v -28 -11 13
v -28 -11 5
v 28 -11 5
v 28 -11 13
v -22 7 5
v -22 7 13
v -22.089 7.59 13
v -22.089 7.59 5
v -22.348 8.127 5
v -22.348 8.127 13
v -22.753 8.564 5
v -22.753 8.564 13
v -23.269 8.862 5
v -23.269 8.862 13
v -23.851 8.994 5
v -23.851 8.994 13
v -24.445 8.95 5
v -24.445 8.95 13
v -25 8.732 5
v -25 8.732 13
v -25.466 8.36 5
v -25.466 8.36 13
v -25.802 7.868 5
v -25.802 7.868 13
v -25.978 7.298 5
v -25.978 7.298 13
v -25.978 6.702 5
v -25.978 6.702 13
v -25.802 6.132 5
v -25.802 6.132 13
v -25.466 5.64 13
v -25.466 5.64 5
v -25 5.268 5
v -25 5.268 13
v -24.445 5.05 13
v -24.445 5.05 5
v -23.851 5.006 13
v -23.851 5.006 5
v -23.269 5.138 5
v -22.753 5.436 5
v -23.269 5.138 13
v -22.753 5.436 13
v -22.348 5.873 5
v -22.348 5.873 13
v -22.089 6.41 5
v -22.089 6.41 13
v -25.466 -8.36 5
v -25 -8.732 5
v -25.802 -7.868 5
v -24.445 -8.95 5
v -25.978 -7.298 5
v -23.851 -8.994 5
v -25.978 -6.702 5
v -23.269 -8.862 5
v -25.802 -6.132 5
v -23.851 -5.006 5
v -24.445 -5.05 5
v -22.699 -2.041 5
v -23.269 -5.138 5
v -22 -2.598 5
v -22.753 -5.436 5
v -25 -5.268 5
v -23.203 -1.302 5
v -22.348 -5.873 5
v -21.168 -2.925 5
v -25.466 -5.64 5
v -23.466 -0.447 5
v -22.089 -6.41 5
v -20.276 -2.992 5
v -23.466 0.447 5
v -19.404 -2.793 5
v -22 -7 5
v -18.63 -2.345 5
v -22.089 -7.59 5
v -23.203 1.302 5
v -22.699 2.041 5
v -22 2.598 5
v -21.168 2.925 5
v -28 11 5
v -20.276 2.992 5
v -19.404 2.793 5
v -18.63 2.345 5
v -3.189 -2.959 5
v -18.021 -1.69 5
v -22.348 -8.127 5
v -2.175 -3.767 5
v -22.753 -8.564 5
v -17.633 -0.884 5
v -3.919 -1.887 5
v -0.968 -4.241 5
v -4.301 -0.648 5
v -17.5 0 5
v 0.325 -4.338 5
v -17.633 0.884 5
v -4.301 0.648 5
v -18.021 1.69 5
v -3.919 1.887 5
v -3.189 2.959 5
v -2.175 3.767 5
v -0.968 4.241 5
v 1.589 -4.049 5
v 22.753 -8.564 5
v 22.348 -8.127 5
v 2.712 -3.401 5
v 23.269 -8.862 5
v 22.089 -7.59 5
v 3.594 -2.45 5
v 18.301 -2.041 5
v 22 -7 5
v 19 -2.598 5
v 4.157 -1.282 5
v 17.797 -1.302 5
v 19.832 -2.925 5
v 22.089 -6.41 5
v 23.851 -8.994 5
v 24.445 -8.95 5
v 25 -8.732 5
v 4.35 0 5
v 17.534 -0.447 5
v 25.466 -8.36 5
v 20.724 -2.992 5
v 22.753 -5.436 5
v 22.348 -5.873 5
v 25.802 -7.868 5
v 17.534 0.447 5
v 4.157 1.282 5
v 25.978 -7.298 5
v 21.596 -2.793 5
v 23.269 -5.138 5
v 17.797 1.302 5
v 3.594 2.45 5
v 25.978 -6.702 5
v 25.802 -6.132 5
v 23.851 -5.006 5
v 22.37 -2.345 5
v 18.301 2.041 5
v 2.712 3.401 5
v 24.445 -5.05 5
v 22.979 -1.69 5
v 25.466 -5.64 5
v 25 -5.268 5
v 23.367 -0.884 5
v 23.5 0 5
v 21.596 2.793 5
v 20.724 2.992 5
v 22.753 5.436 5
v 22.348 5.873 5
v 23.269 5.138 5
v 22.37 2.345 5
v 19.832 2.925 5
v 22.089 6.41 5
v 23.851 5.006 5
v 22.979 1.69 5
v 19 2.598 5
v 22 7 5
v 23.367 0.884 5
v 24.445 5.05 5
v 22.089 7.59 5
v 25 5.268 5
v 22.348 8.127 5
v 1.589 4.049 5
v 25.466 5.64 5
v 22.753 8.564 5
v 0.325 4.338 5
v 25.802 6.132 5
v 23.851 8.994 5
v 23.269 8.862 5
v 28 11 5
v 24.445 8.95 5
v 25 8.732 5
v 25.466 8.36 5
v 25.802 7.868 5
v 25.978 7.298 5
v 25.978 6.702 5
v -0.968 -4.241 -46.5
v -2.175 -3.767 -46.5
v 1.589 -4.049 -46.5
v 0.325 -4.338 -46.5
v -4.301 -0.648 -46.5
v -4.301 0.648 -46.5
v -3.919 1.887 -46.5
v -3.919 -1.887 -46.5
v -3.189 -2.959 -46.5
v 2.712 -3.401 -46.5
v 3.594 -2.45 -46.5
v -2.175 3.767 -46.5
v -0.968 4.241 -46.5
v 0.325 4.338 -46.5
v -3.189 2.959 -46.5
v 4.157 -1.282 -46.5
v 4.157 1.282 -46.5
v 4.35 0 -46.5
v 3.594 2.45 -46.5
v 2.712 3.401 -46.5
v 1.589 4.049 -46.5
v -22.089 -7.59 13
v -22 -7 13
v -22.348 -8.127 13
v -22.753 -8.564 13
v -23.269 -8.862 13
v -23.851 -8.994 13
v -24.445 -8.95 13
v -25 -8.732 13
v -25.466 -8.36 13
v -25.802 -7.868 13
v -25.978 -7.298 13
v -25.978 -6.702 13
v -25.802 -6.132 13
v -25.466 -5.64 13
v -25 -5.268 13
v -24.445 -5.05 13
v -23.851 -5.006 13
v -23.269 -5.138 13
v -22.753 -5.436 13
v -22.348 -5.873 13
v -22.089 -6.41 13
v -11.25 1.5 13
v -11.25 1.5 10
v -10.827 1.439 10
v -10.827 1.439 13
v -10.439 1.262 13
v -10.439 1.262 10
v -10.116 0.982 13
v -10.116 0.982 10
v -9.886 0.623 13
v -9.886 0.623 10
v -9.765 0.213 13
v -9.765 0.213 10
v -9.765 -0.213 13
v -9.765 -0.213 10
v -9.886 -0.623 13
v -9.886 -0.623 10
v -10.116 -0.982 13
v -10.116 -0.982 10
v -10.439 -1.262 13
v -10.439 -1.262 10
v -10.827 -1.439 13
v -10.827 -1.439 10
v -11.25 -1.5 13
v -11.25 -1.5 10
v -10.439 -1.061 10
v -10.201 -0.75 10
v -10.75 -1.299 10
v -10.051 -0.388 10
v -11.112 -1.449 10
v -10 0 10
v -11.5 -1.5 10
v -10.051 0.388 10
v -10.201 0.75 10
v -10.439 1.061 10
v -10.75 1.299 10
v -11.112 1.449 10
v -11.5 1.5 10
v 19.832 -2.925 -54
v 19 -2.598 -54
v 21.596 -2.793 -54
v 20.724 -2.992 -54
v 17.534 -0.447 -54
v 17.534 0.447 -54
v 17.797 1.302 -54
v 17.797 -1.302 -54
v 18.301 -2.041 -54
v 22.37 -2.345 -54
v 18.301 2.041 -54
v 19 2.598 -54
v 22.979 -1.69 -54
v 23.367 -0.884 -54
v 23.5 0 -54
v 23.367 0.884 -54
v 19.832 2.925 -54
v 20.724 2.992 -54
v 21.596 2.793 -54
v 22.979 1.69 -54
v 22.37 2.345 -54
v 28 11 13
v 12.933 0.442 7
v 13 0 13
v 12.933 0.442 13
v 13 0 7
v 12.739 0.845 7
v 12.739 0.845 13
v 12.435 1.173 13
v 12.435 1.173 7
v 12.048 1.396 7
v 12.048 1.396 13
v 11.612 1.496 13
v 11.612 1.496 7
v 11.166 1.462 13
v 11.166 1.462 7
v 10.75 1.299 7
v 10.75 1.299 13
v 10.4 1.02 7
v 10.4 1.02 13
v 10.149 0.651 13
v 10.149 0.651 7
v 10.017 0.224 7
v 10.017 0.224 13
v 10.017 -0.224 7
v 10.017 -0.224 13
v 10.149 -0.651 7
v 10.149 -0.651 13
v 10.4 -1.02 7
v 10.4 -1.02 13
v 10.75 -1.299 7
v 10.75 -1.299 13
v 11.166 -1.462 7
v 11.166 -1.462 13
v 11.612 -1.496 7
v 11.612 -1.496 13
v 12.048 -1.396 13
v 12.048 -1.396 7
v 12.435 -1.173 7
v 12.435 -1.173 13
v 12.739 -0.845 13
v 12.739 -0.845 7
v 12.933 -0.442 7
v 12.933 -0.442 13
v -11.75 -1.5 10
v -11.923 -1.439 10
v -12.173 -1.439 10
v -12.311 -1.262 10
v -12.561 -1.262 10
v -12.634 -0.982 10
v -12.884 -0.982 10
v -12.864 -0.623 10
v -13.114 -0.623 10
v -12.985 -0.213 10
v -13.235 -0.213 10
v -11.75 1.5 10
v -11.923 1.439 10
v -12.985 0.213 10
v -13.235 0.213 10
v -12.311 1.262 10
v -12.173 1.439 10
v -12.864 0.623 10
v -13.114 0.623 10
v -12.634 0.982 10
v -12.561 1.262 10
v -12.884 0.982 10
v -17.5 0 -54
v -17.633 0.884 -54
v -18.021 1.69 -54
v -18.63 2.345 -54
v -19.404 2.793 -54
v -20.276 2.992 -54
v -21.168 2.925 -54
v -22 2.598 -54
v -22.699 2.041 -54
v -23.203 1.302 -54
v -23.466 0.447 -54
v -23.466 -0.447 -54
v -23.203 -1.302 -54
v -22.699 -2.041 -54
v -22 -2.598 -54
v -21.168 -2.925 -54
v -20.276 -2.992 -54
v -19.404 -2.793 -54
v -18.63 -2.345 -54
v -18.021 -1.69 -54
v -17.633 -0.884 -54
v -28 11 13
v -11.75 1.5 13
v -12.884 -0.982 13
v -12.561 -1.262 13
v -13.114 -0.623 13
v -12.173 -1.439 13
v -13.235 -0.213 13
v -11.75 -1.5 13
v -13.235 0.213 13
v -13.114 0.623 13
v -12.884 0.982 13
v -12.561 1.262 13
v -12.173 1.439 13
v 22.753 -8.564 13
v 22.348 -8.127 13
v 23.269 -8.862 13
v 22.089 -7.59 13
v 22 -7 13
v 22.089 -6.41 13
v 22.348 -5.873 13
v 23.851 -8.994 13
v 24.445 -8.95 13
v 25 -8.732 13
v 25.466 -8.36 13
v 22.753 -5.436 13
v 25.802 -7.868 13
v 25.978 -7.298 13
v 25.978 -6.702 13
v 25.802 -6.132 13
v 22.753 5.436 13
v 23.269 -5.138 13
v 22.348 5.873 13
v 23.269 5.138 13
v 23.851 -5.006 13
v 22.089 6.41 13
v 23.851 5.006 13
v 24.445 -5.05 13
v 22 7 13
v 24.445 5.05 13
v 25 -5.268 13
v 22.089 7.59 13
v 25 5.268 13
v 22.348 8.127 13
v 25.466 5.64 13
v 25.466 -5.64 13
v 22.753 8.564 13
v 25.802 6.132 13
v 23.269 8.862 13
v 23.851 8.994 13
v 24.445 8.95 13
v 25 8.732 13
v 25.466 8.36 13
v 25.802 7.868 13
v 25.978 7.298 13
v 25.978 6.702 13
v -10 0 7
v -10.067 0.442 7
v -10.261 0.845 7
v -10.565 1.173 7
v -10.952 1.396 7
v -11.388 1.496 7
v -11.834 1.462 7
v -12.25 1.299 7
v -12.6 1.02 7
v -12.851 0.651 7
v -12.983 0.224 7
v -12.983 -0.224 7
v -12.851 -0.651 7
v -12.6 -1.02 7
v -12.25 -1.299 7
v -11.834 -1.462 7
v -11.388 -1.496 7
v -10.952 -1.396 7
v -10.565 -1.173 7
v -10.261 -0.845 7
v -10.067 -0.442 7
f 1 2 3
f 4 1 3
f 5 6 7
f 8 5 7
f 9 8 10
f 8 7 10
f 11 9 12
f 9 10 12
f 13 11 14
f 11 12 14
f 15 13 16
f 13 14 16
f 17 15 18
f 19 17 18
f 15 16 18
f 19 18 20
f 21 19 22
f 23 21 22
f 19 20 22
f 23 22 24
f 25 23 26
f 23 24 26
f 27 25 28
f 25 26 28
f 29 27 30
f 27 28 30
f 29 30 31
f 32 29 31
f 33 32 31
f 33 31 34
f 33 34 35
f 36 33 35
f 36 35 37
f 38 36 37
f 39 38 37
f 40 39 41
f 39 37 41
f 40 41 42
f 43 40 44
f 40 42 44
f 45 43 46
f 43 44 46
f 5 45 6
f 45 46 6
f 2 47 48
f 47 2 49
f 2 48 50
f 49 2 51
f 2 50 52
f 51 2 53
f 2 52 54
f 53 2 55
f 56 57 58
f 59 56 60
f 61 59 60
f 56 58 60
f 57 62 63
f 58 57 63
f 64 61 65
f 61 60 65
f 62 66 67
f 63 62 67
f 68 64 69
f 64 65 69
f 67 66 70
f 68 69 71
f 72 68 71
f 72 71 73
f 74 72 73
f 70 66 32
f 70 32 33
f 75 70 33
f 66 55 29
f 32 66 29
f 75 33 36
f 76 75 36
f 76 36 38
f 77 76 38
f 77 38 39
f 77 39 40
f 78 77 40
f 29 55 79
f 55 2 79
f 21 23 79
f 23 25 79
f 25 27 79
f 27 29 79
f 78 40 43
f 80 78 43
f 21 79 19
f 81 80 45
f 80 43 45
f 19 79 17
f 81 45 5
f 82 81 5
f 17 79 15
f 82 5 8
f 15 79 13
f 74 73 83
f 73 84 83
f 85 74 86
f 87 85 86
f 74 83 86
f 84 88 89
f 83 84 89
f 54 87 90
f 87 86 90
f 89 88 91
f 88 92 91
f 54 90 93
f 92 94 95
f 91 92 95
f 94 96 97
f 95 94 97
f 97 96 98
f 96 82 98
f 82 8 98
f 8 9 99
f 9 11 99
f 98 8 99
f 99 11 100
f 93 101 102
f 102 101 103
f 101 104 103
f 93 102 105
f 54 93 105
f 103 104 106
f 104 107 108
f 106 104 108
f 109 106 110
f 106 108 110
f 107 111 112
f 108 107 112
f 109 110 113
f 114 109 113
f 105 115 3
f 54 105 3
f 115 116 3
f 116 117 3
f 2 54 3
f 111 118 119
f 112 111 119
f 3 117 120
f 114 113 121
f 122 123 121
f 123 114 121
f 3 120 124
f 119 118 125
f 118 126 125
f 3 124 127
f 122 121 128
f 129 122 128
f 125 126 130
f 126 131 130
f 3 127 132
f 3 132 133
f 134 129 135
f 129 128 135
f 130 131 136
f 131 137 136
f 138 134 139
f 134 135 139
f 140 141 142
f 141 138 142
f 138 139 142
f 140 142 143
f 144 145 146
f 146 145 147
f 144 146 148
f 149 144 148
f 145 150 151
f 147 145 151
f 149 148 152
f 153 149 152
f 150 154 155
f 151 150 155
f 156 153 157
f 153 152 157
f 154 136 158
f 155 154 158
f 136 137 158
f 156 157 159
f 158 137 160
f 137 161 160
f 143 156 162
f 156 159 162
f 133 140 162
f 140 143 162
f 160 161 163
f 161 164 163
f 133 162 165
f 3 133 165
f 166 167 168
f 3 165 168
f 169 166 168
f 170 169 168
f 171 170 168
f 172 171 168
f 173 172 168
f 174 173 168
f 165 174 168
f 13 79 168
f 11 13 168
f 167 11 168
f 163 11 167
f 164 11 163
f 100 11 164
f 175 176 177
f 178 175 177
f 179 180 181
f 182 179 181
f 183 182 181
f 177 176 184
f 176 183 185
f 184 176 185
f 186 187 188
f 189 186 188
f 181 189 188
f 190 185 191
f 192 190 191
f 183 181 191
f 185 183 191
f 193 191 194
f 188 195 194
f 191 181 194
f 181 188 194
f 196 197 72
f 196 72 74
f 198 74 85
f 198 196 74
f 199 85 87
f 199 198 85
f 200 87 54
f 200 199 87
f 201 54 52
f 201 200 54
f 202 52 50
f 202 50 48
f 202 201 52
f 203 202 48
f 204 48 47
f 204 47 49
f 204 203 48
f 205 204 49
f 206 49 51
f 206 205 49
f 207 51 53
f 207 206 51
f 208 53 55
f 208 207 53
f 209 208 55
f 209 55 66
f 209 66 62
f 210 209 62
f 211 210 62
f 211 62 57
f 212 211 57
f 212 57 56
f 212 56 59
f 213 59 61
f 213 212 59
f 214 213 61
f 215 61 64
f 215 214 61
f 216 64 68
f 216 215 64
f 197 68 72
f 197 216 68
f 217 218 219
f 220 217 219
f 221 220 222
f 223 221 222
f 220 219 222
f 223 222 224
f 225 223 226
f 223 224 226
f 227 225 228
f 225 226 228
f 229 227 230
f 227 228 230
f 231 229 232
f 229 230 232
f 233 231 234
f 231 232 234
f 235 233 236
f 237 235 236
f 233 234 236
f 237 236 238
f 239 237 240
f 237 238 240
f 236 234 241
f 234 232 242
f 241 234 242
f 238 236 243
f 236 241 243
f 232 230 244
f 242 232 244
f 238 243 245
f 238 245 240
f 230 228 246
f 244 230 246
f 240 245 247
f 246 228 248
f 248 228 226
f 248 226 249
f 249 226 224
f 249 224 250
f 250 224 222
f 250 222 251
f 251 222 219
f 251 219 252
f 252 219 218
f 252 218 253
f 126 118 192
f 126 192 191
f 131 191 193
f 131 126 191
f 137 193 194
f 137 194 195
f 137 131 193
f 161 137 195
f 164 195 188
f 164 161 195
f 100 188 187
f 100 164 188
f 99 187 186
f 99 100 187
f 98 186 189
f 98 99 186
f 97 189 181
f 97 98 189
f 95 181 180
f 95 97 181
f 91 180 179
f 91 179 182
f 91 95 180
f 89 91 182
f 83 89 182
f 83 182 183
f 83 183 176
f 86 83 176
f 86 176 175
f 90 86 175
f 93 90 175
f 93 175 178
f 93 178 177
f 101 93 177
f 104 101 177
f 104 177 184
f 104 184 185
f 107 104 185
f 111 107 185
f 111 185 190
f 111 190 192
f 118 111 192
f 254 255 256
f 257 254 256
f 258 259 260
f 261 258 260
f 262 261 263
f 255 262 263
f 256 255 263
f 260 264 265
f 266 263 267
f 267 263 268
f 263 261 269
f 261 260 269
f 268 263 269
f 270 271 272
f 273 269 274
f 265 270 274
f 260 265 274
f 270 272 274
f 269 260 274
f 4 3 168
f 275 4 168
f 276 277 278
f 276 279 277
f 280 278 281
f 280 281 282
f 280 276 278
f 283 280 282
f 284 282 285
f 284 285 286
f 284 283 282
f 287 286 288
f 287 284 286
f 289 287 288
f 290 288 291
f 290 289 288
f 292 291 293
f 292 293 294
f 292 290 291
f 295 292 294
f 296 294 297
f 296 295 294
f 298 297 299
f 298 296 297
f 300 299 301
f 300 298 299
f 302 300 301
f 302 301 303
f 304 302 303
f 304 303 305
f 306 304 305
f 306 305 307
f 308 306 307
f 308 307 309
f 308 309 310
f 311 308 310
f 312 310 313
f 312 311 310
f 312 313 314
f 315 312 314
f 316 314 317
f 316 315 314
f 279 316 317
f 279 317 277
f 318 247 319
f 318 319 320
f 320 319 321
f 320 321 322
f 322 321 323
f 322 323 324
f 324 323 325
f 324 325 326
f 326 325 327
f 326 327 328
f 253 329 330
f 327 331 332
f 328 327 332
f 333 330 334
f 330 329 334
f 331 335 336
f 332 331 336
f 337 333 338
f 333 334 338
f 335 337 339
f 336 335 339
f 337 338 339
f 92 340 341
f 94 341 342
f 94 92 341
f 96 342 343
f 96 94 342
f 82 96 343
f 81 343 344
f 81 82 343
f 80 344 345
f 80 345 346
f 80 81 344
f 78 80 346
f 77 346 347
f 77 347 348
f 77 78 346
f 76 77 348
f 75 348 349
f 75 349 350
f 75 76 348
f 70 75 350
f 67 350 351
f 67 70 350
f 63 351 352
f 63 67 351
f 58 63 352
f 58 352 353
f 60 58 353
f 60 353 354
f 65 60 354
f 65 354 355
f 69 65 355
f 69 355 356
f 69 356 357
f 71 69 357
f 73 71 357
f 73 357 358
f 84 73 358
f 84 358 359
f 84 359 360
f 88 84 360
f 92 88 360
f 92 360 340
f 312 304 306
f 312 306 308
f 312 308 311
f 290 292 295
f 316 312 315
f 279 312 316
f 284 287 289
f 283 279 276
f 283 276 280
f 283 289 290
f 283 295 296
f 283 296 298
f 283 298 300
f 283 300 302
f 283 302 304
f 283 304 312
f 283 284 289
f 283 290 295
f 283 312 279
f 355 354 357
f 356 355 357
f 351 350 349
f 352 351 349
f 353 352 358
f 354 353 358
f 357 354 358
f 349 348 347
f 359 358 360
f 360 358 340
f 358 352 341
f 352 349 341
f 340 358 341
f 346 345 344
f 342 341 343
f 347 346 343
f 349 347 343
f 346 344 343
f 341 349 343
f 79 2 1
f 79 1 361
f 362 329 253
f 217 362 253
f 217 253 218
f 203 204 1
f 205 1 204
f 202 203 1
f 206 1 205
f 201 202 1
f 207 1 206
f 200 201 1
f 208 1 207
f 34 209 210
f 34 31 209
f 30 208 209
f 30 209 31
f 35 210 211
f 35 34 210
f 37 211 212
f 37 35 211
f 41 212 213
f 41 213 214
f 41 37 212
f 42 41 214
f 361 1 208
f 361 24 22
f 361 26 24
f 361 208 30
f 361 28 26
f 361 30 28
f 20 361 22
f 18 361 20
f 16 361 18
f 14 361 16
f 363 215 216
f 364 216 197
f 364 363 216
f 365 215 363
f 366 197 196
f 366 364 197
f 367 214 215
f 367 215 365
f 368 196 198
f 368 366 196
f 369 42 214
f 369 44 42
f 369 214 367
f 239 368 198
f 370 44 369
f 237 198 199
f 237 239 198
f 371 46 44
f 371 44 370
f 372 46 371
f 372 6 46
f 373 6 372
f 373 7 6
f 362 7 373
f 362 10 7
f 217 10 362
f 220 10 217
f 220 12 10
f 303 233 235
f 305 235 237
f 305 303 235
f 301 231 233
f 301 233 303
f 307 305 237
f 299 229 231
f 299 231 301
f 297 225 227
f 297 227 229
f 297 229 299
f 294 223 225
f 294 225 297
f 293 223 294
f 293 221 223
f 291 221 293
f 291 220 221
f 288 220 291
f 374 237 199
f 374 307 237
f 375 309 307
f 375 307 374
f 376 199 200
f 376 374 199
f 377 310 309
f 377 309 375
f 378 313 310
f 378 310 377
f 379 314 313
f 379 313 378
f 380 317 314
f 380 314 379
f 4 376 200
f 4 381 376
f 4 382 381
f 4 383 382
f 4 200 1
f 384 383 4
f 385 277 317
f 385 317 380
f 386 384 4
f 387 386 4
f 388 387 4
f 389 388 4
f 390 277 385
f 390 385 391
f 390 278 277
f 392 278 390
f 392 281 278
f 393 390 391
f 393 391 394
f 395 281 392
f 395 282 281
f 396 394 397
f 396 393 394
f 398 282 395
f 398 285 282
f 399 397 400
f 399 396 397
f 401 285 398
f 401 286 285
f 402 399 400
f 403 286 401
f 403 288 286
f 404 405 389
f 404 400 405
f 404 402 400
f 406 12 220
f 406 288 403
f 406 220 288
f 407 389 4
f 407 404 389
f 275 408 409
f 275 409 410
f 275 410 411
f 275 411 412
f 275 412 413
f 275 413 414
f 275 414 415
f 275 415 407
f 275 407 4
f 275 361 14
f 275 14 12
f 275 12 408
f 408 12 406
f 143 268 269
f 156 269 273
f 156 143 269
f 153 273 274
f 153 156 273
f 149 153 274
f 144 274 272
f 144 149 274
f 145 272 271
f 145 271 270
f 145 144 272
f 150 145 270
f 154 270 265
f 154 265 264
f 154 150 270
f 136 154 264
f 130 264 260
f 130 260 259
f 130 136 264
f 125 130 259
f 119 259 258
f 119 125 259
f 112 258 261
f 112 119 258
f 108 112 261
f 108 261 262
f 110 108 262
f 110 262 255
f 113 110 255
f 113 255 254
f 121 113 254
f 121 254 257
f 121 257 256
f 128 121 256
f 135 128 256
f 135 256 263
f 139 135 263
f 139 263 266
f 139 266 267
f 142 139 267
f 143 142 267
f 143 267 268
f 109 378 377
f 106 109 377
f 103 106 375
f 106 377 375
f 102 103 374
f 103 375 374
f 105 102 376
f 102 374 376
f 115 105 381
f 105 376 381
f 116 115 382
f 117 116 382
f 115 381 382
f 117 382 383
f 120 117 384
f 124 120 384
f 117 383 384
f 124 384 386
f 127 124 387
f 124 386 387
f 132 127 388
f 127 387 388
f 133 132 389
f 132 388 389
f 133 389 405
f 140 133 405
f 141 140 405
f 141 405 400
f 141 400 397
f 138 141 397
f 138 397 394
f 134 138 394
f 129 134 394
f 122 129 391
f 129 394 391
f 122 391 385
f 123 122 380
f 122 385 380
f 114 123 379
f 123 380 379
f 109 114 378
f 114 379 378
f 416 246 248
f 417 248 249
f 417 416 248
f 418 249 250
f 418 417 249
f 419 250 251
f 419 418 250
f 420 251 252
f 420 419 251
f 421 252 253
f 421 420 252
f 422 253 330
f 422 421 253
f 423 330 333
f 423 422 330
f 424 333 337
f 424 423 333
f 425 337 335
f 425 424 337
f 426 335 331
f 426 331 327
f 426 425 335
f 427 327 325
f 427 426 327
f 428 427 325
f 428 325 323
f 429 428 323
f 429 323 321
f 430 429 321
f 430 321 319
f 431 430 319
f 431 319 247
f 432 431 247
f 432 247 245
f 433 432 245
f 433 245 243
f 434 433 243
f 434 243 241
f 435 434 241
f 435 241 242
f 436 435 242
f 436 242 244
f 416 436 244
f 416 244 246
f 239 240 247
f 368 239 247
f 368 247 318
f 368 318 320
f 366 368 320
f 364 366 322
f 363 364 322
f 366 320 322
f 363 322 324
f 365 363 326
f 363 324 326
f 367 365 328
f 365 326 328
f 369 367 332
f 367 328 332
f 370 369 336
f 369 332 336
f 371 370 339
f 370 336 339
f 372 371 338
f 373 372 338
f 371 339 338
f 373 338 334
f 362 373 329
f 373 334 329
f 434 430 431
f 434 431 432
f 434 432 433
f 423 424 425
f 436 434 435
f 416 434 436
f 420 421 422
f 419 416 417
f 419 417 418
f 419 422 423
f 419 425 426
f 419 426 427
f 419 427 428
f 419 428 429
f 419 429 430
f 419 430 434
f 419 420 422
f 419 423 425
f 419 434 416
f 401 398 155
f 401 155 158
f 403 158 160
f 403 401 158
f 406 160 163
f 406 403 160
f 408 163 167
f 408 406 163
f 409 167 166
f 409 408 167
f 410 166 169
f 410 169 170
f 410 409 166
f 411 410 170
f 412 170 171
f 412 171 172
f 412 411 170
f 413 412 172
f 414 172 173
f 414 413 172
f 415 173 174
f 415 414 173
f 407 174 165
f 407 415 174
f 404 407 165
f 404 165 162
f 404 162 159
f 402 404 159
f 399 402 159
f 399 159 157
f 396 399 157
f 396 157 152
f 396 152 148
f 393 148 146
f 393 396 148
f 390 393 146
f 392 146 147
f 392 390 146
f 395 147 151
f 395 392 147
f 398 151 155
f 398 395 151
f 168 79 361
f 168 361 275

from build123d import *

# Parameters (mm, degrees)
SKETCH_4_R               = 3
EXTRUDE_1_DEPTH          = 54
CUT_EXTRUDE_1_DEPTH      = 63.657800791
SKETCH_6_R               = 4
CUT_EXTRUDE_2_DEPTH      = 4.5
SKETCH_7_R               = 2.25
CUT_EXTRUDE_3_DEPTH      = 21.5
EXTRUDE_2_DEPTH          = 54
SKETCH_9_R               = 2.5
CUT_EXTRUDE_4_DEPTH      = 5
SKETCH_10_R              = 2.5
CUT_EXTRUDE_5_DEPTH      = 5
SKETCH_11_R              = 4.35
CUT_EXTRUDE_6_DEPTH      = 46.5
SKETCH_12_R              = 1.5
CUT_EXTRUDE_7_DEPTH      = 3
SKETCH_13_R              = 1.5
EXTRUDE_4_DEPTH          = 3
SKETCH_14_R              = 1.5
CUT_EXTRUDE_8_DEPTH      = 6
CUT_EXTRUDE_9_DEPTH      = 3
EXTRUDE_START            = 5
SKETCH_16_W              = 56
SKETCH_16_H              = 22
EXTRUDE_5_DEPTH          = 8
SKETCH_18_R              = 3
EXTRUDE_6_DEPTH          = 67
SKETCH_19_R              = 4.35
EXTRUDE_7_DEPTH          = 59.5
SKETCH_20_R              = 2
CUT_EXTRUDE_10_DEPTH     = 8
MIRROR_4_COPY_1_SKETCH_R = 2
MIRROR_4_COPY_1_DEPTH    = 8
CUT_EXTRUDE_START        = -3
SKETCH_21_R              = 1.5
CUT_EXTRUDE_11_DEPTH     = 3
SKETCH_22_R              = 1.5
CUT_EXTRUDE_12_DEPTH     = 3


with BuildPart() as part:
    # 草图4 → 凸台-拉伸1 (new body)
    with BuildSketch(Plane.XY):
        Polygon((-14.75, -7), (-16.25, -7), (-16.25, -6.5), (-20.75, -6.5), (-20.75, -7), (-22.25, -7), (-22.25, -11), (-20.75, -11), (-20.75, -13), (-29, -13), (-29, 13), (-23, 13), (-20.6, 10.6), (-19.1, 10.6), (-16.7, 13), (0, 13), (0, -13), (-16.25, -13), (-16.25, -11), (-14.75, -11), align=None)
        with Locations((-20.5, 0)):
            Circle(SKETCH_4_R, mode=Mode.SUBTRACT)
    extrude(amount=-EXTRUDE_1_DEPTH)

    # 草图5 → 切除-拉伸1 (cut, through all)
    with BuildSketch(Plane.XY):
        Polygon((-5.5, -12), (-4.5, -12), (-4.5, -13), (-2.25, -13), (-2.25, -12), (-1.25, -12), (-1.25, -10), (-5.5, -10), align=None)
    cut_extrude_1 = extrude(amount=-CUT_EXTRUDE_1_DEPTH, mode=Mode.SUBTRACT)

    # 镜向1: 切除-拉伸1 across plane
    add(cut_extrude_1.mirror(Plane.ZX), mode=Mode.SUBTRACT)

    # 草图6 → 切除-拉伸2 (cut)
    with BuildSketch(Plane(origin=(0, 13, 0), x_dir=(-1, 0, 0), z_dir=(0, 1, 0))):
        with Locations(Location((11.5, -25, 0), (0, 0, 90))):
            Circle(SKETCH_6_R)
        with Locations(Location((11.5, -5, 0), (0, 0, 90))):
            Circle(SKETCH_6_R)
    extrude(amount=-CUT_EXTRUDE_2_DEPTH, mode=Mode.SUBTRACT)

    # 草图7 → 切除-拉伸3 (cut)
    with BuildSketch(Plane(origin=(0, 8.5, 0), x_dir=(1, 0, 0), z_dir=(0, 1, 0))):
        with Locations(Location((-11.5, 25, 0), (0, 0, 270))):
            Circle(SKETCH_7_R)
        with Locations(Location((-11.5, 5, 0), (0, 0, 270))):
            Circle(SKETCH_7_R)
    extrude(amount=-CUT_EXTRUDE_3_DEPTH, mode=Mode.SUBTRACT)

    # 镜向2: part across plane


with BuildPart() as part_1:
    add(part.part)
    add(part.part.mirror(Plane(origin=(0, 0, 0), x_dir=(0, 0, 1), z_dir=(1, 0, 0))))

    # 草图8 → 凸台-拉伸2 (add)
    with BuildSketch(Plane.XY):
        Polygon((16.7, 13), (23, 13), (20.6, 10.6), (19.1, 10.6), align=None)
    extrude(amount=-EXTRUDE_2_DEPTH)

    # 草图9 → 切除-拉伸4 (cut)
    with BuildSketch(Plane(origin=(0, 13, 0), x_dir=(1, 0, 0), z_dir=(0, 1, 0))):
        with Locations(Location((18, 46.5, 0), (0, 0, 270))):
            Circle(SKETCH_9_R)
        with Locations(Location((18, 11, 0), (0, 0, 270))):
            Circle(SKETCH_9_R)
    extrude(amount=-CUT_EXTRUDE_4_DEPTH, mode=Mode.SUBTRACT)

    # 草图10 → 切除-拉伸5 (cut)
    with BuildSketch(Plane(origin=(29, 0, 0), x_dir=(0, 0, -1), z_dir=(1, 0, 0))):
        with Locations((11, 8)):
            Circle(SKETCH_10_R)
        with Locations((38.5, 8)):
            Circle(SKETCH_10_R)
    extrude(amount=-CUT_EXTRUDE_5_DEPTH, mode=Mode.SUBTRACT)

    # 草图11 → 切除-拉伸6 (cut)
    with BuildSketch(Plane.XY):
        Circle(SKETCH_11_R)
    extrude(amount=-CUT_EXTRUDE_6_DEPTH, mode=Mode.SUBTRACT)

    # 草图12 → 切除-拉伸7 (cut)
    with BuildSketch(Plane(origin=(0, 0, -54), x_dir=(-1, 0, 0), z_dir=(0, 0, -1))):
        with Locations((-11.5, 0)):
            Circle(SKETCH_12_R)
        with BuildLine():
            Line((11.75, 1.5), (11.25, 1.5))
            ThreePointArc((11.25, 1.5), (9.75, 0), (11.25, -1.5))
            Line((11.25, -1.5), (11.75, -1.5))
            ThreePointArc((11.75, -1.5), (13.25, 0), (11.75, 1.5))
        make_face()
    extrude(amount=-CUT_EXTRUDE_7_DEPTH, mode=Mode.SUBTRACT)

    # 草图13 → 凸台-拉伸4 (add)
    with BuildSketch(Plane(origin=(0, 0, -51), x_dir=(-1, 0, 0), z_dir=(0, 0, -1))):
        with Locations((11.5, 0)):
            Circle(SKETCH_13_R)
        with Locations((-11.5, 0)):
            Circle(SKETCH_13_R)
    extrude(amount=-EXTRUDE_4_DEPTH)

    # 草图14 → 切除-拉伸8 (cut)
    with BuildSketch(Plane.XZ.offset(13)):
        with Locations(Location((-11.5, -15, 0), (0, 0, 270))):
            Circle(SKETCH_14_R)
        with Locations(Location((11.5, -15, 0), (0, 0, 270))):
            Circle(SKETCH_14_R)
    extrude(amount=-CUT_EXTRUDE_8_DEPTH, mode=Mode.SUBTRACT)

    # 草图15 → 切除-拉伸9 (cut)
    with BuildSketch(Plane.XZ.offset(13)):
        with BuildLine():
            Line((-11.75, -13.5), (-11.25, -13.5))
            ThreePointArc((-11.25, -13.5), (-9.75, -15), (-11.25, -16.5))
            Line((-11.25, -16.5), (-11.75, -16.5))
            ThreePointArc((-11.75, -16.5), (-13.25, -15), (-11.75, -13.5))
        make_face()
    extrude(amount=-CUT_EXTRUDE_9_DEPTH, mode=Mode.SUBTRACT)


with BuildPart() as body_2:
    # 草图16 → 凸台-拉伸5 (new body)
    with BuildSketch(Plane.XY.offset(EXTRUDE_START)):
        Rectangle(SKETCH_16_W, SKETCH_16_H)
    extrude(amount=EXTRUDE_5_DEPTH)

    # 草图18 → 凸台-拉伸6 (add)
    with BuildSketch(Plane.XY.offset(13)):
        with Locations((20.5, 0)):
            Circle(SKETCH_18_R)
        with Locations((-20.5, 0)):
            Circle(SKETCH_18_R)
    extrude(amount=-EXTRUDE_6_DEPTH)

    # 草图19 → 凸台-拉伸7 (add)
    with BuildSketch(Plane.XY.offset(13)):
        Circle(SKETCH_19_R)
    extrude(amount=-EXTRUDE_7_DEPTH)

    # 草图20 → 切除-拉伸10 (cut)
    with BuildSketch(Plane.XY.offset(13)):
        with Locations((-24, 7)):
            Circle(SKETCH_20_R)
    cut_extrude_10 = extrude(amount=-CUT_EXTRUDE_10_DEPTH, mode=Mode.SUBTRACT)

    # 镜向3: 切除-拉伸10 across plane
    add(cut_extrude_10.mirror(Plane.ZX), mode=Mode.SUBTRACT)

    # 镜向4: 切除-拉伸10 across plane
    add(cut_extrude_10.mirror(Plane(origin=(0, 0, 0), x_dir=(0, 0, 1), z_dir=(1, 0, 0))), mode=Mode.SUBTRACT)

    # 镜向4 copy 1 sketch → 镜向4 copy 1 (cut)
    with BuildSketch(Plane(origin=(0, 0, 13), x_dir=(-1, 0, 0), z_dir=(0, 0, 1))):
        with Locations((-24, 7)):
            Circle(MIRROR_4_COPY_1_SKETCH_R)
    extrude(amount=-MIRROR_4_COPY_1_DEPTH, mode=Mode.SUBTRACT)

    # 草图21 → 切除-拉伸11 (cut)
    with BuildSketch(Plane.XY.offset(13).offset(CUT_EXTRUDE_START)):
        with Locations((11.5, 0)):
            Circle(SKETCH_21_R)
        with BuildLine():
            Line((-11.75, 1.5), (-11.25, 1.5))
            ThreePointArc((-11.25, 1.5), (-9.75, 0), (-11.25, -1.5))
            Line((-11.25, -1.5), (-11.75, -1.5))
            ThreePointArc((-11.75, -1.5), (-13.25, 0), (-11.75, 1.5))
        make_face()
    extrude(amount=CUT_EXTRUDE_11_DEPTH, mode=Mode.SUBTRACT)

    # 草图22 → 切除-拉伸12 (cut)
    with BuildSketch(Plane.XY.offset(10).offset(CUT_EXTRUDE_START)):
        with Locations((-11.5, 0)):
            Circle(SKETCH_22_R)
        with Locations((11.5, 0)):
            Circle(SKETCH_22_R)
    extrude(amount=CUT_EXTRUDE_12_DEPTH, mode=Mode.SUBTRACT)


solid = body_2.part
